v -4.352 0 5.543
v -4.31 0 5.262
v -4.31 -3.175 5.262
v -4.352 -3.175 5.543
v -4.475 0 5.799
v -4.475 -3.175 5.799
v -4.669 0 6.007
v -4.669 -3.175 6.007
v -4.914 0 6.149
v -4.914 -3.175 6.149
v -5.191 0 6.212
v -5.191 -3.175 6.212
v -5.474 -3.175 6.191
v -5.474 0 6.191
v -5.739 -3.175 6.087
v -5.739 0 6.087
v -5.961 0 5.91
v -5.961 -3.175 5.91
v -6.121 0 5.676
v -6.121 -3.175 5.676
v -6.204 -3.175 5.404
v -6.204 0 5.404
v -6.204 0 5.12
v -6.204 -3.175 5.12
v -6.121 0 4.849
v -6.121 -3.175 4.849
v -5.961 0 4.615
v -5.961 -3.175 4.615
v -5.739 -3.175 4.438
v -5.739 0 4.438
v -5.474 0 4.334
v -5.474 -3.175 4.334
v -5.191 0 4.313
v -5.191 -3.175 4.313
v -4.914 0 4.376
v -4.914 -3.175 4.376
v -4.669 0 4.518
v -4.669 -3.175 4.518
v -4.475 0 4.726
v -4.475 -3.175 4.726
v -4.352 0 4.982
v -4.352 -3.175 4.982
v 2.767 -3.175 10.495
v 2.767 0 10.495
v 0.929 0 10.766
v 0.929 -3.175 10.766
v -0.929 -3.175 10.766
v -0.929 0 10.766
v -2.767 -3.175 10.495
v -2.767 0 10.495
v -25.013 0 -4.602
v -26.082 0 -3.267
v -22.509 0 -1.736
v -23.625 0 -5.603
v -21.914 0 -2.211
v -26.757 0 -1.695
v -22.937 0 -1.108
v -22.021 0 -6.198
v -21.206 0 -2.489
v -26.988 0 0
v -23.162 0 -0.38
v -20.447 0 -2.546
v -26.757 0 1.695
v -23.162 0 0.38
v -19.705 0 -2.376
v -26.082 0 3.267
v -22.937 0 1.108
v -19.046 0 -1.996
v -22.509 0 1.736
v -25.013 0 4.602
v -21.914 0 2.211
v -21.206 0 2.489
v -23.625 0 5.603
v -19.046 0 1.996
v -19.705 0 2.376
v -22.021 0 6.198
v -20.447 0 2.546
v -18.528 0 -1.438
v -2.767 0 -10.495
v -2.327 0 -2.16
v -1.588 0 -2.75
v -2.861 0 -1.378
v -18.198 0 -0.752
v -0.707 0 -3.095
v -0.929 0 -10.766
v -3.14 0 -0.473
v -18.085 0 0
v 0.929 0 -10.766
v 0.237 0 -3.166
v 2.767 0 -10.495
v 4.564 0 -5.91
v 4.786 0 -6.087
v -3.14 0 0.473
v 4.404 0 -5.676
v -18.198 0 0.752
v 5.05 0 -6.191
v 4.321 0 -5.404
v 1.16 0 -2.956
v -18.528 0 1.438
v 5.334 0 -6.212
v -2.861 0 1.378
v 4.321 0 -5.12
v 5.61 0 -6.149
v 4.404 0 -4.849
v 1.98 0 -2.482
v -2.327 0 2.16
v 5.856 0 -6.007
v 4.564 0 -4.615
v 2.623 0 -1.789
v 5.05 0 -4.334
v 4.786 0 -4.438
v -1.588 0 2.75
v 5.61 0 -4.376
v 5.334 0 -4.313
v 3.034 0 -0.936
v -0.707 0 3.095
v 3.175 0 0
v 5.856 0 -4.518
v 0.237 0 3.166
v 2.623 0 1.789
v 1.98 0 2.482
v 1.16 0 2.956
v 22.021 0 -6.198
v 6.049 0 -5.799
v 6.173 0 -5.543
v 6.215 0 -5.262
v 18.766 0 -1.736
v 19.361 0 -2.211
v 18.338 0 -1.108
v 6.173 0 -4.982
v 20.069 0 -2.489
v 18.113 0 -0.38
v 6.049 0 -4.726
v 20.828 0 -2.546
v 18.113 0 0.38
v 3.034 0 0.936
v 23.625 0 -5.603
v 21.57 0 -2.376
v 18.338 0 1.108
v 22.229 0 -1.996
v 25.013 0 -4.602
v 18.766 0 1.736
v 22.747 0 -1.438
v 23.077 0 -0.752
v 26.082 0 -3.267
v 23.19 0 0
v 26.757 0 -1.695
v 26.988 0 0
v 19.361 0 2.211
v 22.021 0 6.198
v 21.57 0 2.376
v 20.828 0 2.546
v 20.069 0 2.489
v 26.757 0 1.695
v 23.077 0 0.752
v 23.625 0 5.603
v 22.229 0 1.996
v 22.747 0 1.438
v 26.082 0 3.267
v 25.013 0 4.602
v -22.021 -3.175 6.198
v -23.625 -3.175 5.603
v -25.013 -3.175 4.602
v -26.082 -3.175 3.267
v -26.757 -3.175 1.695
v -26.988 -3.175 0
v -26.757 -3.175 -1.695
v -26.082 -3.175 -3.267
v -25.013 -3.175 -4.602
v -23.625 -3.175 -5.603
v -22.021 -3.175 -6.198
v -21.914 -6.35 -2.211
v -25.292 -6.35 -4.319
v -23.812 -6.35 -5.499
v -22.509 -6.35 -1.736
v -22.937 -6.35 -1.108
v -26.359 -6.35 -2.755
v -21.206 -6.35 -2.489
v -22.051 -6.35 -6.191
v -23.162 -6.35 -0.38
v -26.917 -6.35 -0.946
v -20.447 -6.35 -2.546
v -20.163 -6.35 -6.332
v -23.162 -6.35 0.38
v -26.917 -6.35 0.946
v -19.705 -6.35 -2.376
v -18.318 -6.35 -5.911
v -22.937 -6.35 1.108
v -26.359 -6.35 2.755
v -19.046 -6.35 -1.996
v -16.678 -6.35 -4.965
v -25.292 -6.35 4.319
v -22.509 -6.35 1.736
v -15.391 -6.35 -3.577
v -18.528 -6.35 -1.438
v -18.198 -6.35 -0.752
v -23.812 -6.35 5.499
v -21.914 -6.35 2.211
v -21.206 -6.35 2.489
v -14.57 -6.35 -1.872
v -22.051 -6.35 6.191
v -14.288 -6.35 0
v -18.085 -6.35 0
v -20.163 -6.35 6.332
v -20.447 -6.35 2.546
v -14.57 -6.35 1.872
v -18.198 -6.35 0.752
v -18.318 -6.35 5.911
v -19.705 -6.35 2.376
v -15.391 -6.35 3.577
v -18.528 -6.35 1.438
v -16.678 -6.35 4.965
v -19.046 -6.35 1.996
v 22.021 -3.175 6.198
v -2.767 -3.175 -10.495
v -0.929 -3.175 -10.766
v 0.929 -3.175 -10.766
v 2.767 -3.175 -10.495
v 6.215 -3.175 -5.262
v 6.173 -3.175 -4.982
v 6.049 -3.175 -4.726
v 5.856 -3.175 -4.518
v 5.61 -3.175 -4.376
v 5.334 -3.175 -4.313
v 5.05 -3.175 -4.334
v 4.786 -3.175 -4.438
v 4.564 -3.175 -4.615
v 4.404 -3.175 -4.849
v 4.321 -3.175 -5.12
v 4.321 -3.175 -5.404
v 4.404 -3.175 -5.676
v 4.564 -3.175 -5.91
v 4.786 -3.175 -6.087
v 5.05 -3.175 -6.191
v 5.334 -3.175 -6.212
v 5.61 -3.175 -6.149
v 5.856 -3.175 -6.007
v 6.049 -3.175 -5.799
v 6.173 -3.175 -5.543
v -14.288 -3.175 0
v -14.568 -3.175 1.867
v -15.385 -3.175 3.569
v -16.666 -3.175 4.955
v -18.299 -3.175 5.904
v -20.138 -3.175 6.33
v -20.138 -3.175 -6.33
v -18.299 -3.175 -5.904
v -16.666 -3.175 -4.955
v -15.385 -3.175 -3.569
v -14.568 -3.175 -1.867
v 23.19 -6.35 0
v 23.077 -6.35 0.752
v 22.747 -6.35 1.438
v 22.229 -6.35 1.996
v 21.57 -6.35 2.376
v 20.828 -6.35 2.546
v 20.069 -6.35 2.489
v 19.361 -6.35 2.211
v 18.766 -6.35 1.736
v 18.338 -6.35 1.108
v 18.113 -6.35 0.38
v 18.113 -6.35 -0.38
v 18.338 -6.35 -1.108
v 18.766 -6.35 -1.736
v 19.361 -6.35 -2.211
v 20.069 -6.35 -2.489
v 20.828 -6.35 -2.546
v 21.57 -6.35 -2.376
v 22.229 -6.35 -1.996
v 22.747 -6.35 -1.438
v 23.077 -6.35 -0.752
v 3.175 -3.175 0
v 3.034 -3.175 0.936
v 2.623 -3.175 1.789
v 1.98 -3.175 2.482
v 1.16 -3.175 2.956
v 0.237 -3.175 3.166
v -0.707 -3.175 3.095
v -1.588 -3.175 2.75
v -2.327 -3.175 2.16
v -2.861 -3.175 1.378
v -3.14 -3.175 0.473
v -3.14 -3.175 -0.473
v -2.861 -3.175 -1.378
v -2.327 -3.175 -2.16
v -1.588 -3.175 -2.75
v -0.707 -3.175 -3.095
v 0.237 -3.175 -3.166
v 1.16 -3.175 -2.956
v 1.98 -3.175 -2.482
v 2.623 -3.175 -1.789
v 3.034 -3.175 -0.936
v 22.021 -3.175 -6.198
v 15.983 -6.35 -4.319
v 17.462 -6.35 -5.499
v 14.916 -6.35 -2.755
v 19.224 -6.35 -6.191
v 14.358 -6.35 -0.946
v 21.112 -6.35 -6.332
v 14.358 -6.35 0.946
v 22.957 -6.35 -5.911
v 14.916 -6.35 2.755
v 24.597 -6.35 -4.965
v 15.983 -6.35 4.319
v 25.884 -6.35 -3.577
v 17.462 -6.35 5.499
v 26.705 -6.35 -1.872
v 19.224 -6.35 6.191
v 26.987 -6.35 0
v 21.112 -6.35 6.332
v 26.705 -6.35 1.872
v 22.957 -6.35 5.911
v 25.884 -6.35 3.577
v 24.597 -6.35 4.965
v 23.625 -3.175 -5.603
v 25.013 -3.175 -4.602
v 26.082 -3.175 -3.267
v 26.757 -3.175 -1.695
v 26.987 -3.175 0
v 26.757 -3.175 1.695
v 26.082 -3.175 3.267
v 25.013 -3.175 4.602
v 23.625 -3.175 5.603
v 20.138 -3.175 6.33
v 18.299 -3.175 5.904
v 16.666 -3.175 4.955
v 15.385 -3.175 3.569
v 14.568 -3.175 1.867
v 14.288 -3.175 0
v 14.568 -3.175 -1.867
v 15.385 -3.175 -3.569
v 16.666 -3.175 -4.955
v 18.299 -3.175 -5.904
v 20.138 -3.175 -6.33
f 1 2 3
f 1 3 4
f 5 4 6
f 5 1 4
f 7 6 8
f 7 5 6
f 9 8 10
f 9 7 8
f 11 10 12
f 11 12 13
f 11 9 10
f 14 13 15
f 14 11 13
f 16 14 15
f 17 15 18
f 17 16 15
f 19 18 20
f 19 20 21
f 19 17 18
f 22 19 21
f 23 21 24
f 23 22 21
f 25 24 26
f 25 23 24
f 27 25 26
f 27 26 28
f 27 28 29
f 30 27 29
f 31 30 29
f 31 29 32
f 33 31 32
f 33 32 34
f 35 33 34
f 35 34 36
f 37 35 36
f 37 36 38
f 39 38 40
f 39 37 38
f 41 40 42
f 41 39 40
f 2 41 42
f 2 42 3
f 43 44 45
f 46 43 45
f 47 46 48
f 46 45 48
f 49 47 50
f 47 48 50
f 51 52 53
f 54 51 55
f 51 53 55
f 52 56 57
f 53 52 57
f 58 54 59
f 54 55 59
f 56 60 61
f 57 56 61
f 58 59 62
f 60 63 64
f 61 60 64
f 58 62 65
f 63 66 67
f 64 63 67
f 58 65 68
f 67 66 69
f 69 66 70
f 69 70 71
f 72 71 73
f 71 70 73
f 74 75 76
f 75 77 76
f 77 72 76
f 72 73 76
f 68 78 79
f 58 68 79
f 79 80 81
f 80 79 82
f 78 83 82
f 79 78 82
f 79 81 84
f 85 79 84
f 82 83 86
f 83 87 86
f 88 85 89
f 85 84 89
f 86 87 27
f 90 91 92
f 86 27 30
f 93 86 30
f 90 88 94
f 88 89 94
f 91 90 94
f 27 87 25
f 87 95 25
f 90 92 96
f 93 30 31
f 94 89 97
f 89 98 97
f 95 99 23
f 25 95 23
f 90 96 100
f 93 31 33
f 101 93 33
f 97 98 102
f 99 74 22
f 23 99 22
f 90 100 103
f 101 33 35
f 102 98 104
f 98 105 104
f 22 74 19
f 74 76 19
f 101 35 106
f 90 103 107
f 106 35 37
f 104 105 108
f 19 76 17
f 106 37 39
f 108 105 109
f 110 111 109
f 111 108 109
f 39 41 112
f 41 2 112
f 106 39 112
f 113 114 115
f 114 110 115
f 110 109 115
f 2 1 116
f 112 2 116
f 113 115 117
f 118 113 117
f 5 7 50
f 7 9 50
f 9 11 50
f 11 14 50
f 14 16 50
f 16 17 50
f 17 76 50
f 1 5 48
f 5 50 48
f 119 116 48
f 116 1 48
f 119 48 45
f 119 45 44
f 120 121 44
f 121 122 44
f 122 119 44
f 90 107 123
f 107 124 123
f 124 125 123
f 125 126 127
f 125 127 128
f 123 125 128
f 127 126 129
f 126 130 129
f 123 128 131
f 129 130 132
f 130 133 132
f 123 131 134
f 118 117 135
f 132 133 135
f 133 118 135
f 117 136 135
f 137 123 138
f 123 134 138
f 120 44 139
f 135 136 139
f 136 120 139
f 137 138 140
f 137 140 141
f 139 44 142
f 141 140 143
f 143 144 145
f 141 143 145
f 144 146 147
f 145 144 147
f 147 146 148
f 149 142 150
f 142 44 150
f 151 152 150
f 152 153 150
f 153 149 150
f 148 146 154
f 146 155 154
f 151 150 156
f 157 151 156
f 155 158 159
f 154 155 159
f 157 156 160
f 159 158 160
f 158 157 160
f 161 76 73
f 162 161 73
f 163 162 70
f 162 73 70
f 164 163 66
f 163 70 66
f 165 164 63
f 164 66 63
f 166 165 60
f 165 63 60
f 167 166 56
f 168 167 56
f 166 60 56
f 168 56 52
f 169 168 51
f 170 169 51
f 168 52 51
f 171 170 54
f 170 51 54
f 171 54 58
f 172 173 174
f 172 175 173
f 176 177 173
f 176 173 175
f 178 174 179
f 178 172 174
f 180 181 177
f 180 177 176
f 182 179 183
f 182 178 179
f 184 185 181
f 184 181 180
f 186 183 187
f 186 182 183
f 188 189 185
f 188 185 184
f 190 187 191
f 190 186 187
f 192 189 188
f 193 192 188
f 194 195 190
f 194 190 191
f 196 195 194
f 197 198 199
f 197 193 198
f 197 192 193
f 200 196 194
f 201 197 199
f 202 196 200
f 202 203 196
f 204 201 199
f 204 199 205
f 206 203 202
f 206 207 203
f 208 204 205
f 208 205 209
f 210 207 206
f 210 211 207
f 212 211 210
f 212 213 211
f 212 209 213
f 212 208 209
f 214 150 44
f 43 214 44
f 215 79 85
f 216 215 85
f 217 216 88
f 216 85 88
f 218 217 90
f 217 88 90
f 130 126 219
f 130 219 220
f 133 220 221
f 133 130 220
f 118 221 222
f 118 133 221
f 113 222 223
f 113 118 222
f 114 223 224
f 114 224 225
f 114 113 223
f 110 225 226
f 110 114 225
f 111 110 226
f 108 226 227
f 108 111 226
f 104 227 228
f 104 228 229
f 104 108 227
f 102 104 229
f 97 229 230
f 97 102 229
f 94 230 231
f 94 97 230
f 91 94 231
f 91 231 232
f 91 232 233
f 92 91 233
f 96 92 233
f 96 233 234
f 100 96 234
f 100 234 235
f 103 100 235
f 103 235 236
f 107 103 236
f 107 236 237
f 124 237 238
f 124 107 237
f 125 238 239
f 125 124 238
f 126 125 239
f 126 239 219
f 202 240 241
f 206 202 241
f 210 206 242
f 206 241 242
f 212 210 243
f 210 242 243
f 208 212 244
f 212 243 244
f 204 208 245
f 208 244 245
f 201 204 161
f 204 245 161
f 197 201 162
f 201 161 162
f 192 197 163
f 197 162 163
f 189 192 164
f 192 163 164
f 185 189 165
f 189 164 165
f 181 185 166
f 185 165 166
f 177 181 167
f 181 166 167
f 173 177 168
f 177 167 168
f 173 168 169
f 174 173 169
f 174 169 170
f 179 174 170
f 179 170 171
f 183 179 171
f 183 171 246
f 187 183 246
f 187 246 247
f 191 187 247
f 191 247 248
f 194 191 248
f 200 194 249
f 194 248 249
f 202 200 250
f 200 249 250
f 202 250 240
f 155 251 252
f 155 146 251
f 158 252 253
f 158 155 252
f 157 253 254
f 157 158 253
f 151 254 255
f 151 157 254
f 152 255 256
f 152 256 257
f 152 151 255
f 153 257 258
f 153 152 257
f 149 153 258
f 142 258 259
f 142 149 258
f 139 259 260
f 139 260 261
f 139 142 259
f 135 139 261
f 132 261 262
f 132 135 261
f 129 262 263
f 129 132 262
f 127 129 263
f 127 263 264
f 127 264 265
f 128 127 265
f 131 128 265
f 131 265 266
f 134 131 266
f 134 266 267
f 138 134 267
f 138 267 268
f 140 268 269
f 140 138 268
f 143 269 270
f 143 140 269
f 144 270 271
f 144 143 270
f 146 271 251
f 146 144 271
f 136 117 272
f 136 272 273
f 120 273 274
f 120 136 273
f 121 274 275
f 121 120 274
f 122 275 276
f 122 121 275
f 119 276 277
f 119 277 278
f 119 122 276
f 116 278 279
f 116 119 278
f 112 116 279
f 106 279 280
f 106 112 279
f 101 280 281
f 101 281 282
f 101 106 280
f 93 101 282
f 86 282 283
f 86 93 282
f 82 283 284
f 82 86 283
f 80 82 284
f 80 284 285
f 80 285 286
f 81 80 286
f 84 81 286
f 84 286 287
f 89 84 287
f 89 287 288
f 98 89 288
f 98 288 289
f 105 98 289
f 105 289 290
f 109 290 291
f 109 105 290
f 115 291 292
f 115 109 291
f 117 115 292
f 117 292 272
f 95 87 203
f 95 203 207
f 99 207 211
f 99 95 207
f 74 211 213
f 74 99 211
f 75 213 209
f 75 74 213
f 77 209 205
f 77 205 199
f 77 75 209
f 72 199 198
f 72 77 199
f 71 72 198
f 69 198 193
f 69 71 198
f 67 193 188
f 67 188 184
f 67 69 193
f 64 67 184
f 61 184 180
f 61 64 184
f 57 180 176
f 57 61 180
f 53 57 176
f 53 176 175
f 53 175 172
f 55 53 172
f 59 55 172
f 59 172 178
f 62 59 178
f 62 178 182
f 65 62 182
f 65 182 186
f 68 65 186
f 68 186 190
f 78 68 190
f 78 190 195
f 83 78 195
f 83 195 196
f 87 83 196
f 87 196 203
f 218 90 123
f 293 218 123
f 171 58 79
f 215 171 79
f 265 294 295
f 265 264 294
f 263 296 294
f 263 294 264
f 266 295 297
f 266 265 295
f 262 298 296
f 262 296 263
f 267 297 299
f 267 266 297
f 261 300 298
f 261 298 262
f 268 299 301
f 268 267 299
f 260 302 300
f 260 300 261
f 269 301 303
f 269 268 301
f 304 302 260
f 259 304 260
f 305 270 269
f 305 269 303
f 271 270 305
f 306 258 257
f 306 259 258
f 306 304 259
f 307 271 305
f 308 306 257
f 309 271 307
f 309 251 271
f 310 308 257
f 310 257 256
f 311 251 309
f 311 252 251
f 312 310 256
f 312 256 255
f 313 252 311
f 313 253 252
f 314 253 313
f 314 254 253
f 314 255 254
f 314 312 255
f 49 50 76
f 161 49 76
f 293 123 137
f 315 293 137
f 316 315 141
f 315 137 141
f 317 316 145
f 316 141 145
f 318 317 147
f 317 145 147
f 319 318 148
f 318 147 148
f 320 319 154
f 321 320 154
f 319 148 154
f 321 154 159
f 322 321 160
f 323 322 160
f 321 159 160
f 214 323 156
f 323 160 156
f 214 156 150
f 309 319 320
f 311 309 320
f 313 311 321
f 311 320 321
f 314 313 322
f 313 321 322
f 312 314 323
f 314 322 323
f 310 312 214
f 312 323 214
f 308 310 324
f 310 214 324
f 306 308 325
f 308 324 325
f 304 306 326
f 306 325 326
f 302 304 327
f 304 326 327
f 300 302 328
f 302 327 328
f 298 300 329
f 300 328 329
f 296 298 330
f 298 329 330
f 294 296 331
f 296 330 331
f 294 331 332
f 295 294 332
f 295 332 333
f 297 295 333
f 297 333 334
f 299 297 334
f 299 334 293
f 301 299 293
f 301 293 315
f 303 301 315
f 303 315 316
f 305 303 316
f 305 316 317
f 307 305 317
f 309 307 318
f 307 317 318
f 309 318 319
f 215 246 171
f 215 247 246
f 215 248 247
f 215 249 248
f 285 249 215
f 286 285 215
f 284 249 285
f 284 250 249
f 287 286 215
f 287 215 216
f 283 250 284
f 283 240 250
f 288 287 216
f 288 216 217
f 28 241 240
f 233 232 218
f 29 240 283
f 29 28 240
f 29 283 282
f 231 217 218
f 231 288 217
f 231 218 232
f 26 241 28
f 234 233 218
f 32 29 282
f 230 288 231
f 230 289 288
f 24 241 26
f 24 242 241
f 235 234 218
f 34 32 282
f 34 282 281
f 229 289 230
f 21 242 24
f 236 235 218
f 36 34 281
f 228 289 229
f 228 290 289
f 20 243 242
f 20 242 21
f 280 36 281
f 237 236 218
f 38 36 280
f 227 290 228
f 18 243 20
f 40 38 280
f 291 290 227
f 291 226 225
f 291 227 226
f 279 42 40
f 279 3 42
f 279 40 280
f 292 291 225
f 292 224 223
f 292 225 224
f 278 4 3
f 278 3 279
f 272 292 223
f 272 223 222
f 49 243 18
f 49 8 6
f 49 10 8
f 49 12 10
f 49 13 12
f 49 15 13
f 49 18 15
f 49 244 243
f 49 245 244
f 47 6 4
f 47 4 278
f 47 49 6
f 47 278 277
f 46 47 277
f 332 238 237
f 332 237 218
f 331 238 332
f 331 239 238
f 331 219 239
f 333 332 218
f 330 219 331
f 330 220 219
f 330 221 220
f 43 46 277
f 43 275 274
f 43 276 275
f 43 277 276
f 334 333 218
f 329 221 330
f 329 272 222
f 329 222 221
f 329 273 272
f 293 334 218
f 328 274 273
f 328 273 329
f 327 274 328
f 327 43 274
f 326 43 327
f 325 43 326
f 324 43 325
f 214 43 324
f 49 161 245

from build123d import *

# Parameters (mm, degrees)
F0_R     = 0.9525
F0_R_2   = 2.5527
F0_R_3   = 3.175
F1_DEPTH = 3.175
F2_R     = 6.35
F2_R_2   = 2.5527
F3_DEPTH = 3.175


with BuildPart() as f1:
    # F0 (on Front) → F1 (new body)
    with BuildSketch(Plane.XZ):
        with BuildLine():
            Line((-2.766543, 10.495013), (-22.020772, 6.197504))
            ThreePointArc((-22.020772, 6.197504), (-26.9875, 0), (-22.020772, -6.197504))
            Line((-22.020772, -6.197504), (-2.766543, -10.495013))
            ThreePointArc((-2.766543, -10.495013), (0, -10.800004), (2.766543, -10.495013))
            Line((2.766543, -10.495013), (22.020772, -6.197504))
            ThreePointArc((22.020772, -6.197504), (26.9875, 0), (22.020772, 6.197504))
            Line((22.020772, 6.197504), (2.766543, 10.495013))
            ThreePointArc((2.766543, 10.495013), (0, 10.800004), (-2.766543, 10.495013))
        make_face()
        with Locations((5.26243, -5.26243)):
            Circle(F0_R, mode=Mode.SUBTRACT)
        with Locations((-20.6375, 0)):
            Circle(F0_R_2, mode=Mode.SUBTRACT)
        with Locations((-5.26243, 5.26243)):
            Circle(F0_R, mode=Mode.SUBTRACT)
        Circle(F0_R_3, mode=Mode.SUBTRACT)
        with Locations((20.6375, 0)):
            Circle(F0_R_2, mode=Mode.SUBTRACT)
    extrude(amount=F1_DEPTH)

    # F2 (on face) → F3 (join)
    with BuildSketch(Plane.XZ.offset(3.175)):
        with Locations((20.6375, 0)):
            Circle(F2_R)
        with Locations((20.6375, 0)):
            Circle(F2_R_2, mode=Mode.SUBTRACT)
        with Locations((-20.6375, 0)):
            Circle(F2_R)
        with Locations((-20.6375, 0)):
            Circle(F2_R_2, mode=Mode.SUBTRACT)
    extrude(amount=F3_DEPTH)


solid = f1.part
